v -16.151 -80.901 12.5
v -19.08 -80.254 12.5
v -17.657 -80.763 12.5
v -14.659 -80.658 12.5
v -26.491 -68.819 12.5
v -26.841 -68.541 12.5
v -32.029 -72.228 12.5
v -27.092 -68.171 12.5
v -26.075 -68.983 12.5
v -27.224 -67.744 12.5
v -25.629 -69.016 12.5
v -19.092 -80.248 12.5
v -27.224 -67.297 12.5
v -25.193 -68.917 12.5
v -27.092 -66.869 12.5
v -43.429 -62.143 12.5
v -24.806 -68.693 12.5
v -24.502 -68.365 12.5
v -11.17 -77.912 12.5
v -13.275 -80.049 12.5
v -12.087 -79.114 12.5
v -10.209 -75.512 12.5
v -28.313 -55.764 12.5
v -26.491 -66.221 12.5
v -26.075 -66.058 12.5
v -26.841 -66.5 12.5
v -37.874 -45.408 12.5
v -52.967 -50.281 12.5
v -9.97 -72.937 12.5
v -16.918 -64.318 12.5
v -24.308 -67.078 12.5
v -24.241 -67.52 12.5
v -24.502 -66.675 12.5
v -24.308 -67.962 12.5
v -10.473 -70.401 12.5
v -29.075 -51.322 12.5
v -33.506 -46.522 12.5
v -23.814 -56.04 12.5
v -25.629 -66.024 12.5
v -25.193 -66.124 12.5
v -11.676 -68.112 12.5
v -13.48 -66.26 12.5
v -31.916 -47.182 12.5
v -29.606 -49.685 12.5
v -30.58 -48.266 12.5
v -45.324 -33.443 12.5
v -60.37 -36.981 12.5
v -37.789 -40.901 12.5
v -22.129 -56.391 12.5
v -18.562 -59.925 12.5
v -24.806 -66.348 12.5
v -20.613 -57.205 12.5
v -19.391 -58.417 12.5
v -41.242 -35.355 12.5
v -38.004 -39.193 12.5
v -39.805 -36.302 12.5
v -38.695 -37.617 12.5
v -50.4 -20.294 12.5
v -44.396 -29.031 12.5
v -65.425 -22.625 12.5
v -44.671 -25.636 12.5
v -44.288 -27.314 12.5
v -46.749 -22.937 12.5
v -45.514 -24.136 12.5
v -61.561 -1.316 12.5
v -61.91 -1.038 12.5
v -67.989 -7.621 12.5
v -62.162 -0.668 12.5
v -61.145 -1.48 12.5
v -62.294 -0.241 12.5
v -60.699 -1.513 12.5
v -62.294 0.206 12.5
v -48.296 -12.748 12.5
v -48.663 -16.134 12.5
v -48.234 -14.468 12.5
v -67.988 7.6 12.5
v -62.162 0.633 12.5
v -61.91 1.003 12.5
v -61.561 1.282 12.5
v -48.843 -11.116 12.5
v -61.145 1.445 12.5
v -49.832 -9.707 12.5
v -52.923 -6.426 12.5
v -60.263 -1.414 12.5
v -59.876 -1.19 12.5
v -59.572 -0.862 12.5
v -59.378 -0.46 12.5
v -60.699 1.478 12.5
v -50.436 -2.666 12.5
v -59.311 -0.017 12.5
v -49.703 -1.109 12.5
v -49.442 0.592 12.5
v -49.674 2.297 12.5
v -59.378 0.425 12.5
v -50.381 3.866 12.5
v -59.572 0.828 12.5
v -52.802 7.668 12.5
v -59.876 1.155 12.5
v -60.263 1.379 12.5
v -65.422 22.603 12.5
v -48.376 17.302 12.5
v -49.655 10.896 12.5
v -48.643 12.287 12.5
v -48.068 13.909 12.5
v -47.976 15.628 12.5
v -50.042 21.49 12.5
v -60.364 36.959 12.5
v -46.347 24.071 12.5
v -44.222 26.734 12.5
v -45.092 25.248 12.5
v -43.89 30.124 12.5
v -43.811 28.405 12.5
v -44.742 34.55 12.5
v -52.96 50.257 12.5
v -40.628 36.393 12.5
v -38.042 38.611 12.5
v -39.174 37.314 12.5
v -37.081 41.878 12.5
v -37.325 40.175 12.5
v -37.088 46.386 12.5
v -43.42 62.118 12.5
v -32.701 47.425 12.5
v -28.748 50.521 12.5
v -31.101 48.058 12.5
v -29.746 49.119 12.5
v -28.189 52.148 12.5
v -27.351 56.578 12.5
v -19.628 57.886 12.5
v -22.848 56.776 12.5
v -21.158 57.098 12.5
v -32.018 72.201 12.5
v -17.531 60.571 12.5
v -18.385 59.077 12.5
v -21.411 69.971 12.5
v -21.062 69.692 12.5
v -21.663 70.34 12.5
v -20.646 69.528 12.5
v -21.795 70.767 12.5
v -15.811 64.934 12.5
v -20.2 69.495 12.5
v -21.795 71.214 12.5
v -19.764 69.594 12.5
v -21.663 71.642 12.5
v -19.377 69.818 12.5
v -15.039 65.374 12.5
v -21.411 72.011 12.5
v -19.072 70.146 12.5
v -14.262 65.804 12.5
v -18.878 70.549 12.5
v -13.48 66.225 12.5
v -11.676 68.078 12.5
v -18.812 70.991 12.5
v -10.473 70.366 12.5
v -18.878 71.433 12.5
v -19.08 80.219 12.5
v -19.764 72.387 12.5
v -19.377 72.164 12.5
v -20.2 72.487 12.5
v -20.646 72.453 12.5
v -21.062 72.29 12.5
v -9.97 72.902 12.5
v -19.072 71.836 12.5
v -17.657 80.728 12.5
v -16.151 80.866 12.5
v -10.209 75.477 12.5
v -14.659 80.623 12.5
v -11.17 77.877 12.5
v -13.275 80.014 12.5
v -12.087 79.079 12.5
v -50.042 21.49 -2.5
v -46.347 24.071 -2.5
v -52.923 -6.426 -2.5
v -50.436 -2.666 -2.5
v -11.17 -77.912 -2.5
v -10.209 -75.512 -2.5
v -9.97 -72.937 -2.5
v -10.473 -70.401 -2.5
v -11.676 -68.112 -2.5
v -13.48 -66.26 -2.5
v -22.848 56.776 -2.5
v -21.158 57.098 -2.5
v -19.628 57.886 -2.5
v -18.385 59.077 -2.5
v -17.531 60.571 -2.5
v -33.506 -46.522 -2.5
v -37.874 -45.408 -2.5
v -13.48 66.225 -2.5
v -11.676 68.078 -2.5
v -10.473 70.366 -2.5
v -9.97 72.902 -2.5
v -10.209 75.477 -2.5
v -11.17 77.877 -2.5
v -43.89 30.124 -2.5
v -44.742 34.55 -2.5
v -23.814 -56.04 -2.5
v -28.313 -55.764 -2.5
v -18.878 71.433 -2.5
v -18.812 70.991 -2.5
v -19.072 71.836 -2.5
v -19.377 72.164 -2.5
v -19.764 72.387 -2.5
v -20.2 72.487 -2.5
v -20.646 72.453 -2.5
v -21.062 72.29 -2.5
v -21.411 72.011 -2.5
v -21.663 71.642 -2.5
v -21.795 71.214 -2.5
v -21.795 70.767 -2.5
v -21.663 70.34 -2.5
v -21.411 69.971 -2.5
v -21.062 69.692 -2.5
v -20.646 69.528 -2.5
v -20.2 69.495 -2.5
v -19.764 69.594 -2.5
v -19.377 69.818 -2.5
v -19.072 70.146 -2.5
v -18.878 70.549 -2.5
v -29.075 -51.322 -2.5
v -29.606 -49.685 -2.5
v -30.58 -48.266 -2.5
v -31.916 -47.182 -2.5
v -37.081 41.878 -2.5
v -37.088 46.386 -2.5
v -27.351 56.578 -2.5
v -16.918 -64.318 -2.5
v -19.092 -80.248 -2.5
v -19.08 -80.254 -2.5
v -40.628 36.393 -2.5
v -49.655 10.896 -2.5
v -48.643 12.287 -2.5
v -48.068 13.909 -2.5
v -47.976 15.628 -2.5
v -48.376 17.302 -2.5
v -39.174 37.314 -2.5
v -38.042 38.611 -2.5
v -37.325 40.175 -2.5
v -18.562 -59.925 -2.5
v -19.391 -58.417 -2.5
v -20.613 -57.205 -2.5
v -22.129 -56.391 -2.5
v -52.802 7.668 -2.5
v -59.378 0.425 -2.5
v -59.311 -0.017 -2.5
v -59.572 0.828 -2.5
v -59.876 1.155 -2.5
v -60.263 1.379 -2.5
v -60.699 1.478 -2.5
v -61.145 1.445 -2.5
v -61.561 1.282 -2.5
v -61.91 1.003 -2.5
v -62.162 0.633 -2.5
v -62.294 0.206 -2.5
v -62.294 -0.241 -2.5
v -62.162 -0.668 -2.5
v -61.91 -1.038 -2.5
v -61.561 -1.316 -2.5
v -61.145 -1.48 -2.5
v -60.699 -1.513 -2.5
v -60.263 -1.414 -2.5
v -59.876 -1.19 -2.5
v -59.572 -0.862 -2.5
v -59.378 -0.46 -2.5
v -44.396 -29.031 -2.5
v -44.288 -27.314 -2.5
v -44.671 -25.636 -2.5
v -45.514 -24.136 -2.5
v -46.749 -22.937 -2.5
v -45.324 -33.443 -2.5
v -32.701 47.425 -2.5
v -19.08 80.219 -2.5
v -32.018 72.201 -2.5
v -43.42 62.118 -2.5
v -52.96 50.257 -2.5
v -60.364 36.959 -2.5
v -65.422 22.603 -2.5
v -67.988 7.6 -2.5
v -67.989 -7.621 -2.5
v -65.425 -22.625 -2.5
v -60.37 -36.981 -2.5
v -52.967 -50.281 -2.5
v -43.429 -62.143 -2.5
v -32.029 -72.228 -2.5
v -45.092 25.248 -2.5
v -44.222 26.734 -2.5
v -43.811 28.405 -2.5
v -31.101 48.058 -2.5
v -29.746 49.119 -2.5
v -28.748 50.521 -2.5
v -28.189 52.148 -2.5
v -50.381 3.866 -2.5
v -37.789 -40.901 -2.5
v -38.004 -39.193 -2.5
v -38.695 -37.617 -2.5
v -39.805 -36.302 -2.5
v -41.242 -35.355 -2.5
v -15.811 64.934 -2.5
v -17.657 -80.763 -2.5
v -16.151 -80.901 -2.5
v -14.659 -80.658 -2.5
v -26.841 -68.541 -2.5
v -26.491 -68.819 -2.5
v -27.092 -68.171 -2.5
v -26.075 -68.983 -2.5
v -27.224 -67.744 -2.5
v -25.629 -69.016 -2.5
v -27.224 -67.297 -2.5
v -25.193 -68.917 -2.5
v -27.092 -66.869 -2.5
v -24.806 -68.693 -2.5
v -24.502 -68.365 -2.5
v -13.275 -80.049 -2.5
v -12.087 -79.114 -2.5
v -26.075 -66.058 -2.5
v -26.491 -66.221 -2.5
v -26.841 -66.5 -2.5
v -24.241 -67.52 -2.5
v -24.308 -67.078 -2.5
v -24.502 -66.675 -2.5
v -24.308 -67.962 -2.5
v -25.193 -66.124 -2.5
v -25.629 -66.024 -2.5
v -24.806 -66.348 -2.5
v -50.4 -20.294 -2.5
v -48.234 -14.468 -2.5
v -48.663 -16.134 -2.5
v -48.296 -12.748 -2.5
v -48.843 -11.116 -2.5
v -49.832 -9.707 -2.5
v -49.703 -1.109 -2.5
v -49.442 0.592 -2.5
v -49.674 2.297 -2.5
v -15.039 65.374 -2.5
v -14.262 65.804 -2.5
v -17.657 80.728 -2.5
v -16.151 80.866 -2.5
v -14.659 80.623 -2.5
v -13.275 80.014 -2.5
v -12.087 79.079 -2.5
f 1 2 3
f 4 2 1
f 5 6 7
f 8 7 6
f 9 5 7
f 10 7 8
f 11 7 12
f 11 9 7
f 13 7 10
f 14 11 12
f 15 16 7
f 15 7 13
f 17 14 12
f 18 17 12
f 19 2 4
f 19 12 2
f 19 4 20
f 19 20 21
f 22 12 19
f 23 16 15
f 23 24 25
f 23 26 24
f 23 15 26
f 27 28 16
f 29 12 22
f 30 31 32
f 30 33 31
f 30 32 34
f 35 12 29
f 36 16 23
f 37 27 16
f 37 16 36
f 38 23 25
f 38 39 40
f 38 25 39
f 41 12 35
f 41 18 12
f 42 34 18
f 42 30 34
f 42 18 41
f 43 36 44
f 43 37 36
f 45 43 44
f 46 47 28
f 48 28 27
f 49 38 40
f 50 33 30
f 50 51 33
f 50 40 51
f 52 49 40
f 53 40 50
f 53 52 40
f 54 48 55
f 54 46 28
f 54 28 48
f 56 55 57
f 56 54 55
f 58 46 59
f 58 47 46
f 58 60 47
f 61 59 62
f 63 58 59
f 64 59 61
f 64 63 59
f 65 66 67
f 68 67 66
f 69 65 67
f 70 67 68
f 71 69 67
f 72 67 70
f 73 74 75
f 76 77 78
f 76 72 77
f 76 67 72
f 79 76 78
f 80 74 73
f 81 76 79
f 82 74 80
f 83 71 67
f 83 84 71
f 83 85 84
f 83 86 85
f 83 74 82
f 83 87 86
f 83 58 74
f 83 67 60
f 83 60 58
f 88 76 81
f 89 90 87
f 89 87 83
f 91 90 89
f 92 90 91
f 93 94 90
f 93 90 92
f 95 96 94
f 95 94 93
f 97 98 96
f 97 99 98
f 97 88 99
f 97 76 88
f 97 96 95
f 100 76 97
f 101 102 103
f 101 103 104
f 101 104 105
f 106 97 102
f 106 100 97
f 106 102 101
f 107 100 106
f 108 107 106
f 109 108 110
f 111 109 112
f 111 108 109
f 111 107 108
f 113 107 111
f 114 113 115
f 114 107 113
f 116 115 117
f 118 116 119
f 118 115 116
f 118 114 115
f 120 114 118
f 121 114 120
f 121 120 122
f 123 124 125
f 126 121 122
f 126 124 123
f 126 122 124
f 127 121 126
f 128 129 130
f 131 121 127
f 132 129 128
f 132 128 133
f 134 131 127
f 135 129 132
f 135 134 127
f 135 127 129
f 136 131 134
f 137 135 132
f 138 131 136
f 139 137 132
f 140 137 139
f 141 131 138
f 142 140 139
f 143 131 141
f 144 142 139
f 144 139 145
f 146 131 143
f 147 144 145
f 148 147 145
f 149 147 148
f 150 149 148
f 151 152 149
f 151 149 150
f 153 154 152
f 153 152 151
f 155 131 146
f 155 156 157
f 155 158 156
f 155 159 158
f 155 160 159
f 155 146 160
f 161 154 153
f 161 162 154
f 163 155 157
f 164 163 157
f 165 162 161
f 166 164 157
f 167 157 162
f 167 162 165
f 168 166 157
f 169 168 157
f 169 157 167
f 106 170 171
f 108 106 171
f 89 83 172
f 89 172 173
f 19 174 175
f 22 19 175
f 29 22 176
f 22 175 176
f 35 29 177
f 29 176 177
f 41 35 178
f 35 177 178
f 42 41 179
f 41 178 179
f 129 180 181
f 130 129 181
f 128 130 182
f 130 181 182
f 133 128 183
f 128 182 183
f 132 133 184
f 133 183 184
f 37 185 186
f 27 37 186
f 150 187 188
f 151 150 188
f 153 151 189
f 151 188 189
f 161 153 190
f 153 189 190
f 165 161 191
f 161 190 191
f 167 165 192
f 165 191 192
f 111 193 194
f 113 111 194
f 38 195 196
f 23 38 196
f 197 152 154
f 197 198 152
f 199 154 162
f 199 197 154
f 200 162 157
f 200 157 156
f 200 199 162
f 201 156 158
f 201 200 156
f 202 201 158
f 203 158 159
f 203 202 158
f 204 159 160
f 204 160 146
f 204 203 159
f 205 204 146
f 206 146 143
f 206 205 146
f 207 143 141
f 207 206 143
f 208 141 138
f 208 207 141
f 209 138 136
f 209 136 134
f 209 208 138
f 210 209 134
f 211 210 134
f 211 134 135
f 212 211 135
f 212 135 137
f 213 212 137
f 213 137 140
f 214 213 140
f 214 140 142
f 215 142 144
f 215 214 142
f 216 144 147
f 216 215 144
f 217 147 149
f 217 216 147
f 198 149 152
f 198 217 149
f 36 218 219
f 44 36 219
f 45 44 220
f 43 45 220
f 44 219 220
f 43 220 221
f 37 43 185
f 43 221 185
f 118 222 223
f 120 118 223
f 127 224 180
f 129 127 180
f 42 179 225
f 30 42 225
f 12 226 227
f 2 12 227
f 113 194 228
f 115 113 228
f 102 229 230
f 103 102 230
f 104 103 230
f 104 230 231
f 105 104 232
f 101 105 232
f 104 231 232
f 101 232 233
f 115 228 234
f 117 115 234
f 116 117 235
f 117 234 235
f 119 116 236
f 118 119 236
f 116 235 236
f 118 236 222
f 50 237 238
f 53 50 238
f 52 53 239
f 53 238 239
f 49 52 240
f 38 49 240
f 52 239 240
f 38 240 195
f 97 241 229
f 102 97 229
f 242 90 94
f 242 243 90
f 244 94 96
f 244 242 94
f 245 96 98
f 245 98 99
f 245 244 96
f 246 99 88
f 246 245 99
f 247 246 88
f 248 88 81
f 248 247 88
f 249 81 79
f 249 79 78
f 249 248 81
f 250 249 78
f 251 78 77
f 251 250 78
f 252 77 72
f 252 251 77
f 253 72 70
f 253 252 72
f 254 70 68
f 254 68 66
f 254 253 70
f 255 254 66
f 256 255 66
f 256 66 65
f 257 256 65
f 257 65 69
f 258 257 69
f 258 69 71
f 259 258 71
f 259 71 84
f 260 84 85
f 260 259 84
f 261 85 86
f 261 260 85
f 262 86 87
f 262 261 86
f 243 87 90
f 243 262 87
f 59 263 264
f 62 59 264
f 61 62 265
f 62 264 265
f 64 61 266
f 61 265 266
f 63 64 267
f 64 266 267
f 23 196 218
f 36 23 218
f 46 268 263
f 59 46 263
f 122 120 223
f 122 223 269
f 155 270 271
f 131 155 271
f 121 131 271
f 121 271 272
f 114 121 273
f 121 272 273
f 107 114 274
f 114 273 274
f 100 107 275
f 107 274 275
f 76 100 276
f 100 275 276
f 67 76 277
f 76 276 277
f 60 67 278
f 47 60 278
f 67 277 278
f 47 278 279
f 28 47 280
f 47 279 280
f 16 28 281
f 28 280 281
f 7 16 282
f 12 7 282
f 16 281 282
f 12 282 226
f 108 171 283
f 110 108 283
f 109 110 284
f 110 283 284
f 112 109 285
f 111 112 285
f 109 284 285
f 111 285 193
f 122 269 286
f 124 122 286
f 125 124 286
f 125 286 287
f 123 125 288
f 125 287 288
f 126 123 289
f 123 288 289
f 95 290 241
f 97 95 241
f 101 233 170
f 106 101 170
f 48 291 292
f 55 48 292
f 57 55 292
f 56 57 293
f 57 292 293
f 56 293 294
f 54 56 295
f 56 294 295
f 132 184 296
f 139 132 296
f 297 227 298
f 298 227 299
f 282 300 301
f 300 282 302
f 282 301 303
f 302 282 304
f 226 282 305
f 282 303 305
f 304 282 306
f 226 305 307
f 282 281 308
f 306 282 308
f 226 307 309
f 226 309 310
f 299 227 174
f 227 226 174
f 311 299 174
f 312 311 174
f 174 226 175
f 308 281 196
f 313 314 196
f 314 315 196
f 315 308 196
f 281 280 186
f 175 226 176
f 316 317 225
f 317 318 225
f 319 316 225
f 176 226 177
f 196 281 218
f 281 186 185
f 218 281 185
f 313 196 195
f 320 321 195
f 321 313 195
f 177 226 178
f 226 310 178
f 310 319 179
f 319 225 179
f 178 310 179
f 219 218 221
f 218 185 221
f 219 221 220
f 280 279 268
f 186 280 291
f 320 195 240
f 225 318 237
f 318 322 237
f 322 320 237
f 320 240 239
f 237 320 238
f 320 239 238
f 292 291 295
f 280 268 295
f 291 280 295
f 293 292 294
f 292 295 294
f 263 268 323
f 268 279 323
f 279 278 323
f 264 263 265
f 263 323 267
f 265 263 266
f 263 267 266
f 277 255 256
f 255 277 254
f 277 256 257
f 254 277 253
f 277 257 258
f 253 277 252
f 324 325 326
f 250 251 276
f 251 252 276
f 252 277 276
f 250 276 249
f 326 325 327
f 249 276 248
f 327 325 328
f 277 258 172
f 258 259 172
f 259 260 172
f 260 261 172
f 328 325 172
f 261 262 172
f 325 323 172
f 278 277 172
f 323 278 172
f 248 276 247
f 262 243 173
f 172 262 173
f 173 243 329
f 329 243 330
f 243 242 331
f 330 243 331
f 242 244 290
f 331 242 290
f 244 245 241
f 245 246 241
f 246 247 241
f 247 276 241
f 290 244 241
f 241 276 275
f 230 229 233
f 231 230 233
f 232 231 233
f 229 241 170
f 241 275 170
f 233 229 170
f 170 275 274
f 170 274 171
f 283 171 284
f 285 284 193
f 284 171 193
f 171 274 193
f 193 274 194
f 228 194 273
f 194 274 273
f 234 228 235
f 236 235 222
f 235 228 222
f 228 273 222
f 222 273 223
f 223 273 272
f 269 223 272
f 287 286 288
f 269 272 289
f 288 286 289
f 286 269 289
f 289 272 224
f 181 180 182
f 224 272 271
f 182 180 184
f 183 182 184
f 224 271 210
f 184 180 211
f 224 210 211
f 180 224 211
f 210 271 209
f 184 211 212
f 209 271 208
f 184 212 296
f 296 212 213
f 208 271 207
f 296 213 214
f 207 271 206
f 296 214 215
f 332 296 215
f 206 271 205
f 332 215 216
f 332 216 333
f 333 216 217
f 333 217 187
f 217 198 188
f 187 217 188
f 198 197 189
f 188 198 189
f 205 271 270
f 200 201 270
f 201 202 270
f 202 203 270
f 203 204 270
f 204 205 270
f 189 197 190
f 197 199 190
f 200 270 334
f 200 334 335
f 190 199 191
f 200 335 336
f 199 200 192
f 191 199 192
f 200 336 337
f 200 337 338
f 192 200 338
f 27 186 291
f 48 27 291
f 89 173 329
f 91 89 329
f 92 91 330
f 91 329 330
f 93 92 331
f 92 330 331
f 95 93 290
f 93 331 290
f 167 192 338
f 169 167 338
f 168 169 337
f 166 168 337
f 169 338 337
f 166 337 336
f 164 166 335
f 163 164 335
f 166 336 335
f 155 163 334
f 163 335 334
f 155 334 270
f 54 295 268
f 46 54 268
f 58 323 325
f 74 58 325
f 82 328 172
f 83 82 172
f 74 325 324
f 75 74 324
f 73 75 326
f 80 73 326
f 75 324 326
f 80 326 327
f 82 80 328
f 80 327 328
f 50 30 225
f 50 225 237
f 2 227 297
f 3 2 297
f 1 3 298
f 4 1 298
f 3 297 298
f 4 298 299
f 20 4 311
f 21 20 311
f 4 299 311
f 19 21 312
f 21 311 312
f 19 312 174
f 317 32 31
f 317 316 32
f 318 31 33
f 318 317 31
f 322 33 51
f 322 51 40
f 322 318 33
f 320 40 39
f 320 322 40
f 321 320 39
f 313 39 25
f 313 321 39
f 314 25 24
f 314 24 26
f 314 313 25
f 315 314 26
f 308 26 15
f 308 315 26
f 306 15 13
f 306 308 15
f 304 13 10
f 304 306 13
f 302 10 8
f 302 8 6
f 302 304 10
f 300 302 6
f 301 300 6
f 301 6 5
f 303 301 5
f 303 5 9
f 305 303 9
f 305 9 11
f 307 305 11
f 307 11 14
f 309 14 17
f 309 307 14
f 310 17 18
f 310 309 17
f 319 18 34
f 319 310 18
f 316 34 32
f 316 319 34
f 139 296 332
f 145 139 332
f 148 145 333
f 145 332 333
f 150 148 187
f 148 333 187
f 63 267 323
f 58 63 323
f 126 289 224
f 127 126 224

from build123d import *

# Parameters (mm, degrees)
SKETCH_1_R        = 1
EXTRUDE_1_DEPTH   = 1
SKETCH_1_2_R      = 1
EXTRUDE_1_2_DEPTH = 8
SKETCH_1_3_R      = 1
EXTRUDE_2_DEPTH   = 10
SCALE_4_SCALE     = 1.5


with BuildPart() as part:
    # 草图1 → Extrude 1 (new body)
    with BuildSketch(Plane.XY):
        with BuildLine():
            Line((-23.446136356, -44.161959762), (-25.73775467, -42.866863479))
            Line((-25.73775467, -42.866863479), (-26.834295942, -39.938466016))
            ThreePointArc((-26.834295942, -39.938466016), (-28.201527977, -38.125336415), (-30.335428898, -37.348658075))
            Line((-30.335428898, -37.348658075), (-33.334907776, -37.164700371))
            Line((-33.334907776, -37.164700371), (-33.842709051, -34.202800331))
            ThreePointArc((-33.842709051, -34.202800331), (-34.84597704, -32.165592505), (-36.7965457, -31.002818113))
            Line((-36.7965457, -31.002818113), (-39.708425324, -30.260072511))
            Line((-39.708425324, -30.260072511), (-39.652227319, -27.255483394))
            ThreePointArc((-39.652227319, -27.255483394), (-40.255989993, -25.066366444), (-41.954126526, -23.558687864))
            Line((-41.954126526, -23.558687864), (-44.675252109, -22.283466496))
            Line((-44.675252109, -22.283466496), (-44.057045667, -19.342627369))
            ThreePointArc((-44.057045667, -19.342627369), (-44.239914432, -17.079151855), (-45.625461503, -15.279979352))
            Line((-45.625461503, -15.279979352), (-48.059435816, -13.517457571))
            Line((-48.059435816, -13.517457571), (-46.901121207, -10.744549126))
            ThreePointArc((-46.901121207, -10.744549126), (-46.656617846, -8.486899797), (-47.680491761, -6.459969953))
            Line((-47.680491761, -6.459969953), (-49.741090048, -4.272585973))
            Line((-49.741090048, -4.272585973), (-48.083701146, -1.765839874))
            ThreePointArc((-48.083701146, -1.765839874), (-47.420487313, 0.406004917), (-48.046416828, 2.588887101))
            Line((-48.046416828, 2.588887101), (-49.660641368, 5.123644113))
            Line((-49.660641368, 5.123644113), (-47.562892001, 7.275425136))
            ThreePointArc((-47.562892001, 7.275425136), (-46.504462376, 9.284526705), (-46.710273625, 11.546031539))
            Line((-46.710273625, 11.546031539), (-47.82093971, 14.338366552))
            Line((-47.82093971, 14.338366552), (-45.357143694, 16.058954583))
            ThreePointArc((-45.357143694, 16.058954583), (-43.940993675, 17.834139505), (-43.719395692, 20.094152054))
            Line((-43.719395692, 20.094152054), (-44.287157421, 23.045145208))
            Line((-44.287157421, 23.045145208), (-41.54459596, 24.273587558))
            ThreePointArc((-41.54459596, 24.273587558), (-39.820893366, 25.751969023), (-39.17973637, 27.930427214))
            Line((-39.17973637, 27.930427214), (-39.184480502, 30.935538106))
            Line((-39.184480502, 30.935538106), (-36.260310201, 31.628316593))
            ThreePointArc((-36.260310201, 31.628316593), (-34.290118058, 32.757522199), (-33.252115355, 34.777253066))
            Line((-33.252115355, 34.777253066), (-32.693673826, 37.730024144))
            Line((-32.693673826, 37.730024144), (-29.691484877, 37.862596744))
            ThreePointArc((-29.691484877, 37.862596744), (-27.544598222, 38.602623821), (-26.146521576, 40.39207739))
            Line((-26.146521576, 40.39207739), (-25, 43.301270189))
            ThreePointArc((-25, 43.301270189), (-24.226890609, 43.73851588), (-23.446136356, 44.161959762))
            ThreePointArc((-23.446136356, 44.161959762), (-21.212806241, 47.755648425), (-21.906244367, 51.929556087))
            ThreePointArc((-21.906244367, 51.929556087), (-24.232021318, 53.76021953), (-27.179564099, 53.490852446))
            ThreePointArc((-27.179564099, 53.490852446), (-59.999999835, 0.004450967), (-27.1875, -53.486819346))
            Line((-27.1875, -53.486819346), (-27.179564099, -53.490852446))
            ThreePointArc((-27.179564099, -53.490852446), (-24.232021318, -53.76021953), (-21.906244367, -51.929556087))
            ThreePointArc((-21.906244367, -51.929556087), (-21.212806241, -47.755648425), (-23.446136356, -44.161959762))
        make_face()
        with Locations((-31.620079453, -45.001895242)):
            Circle(SKETCH_1_R, mode=Mode.SUBTRACT)
        with Locations((-55, 0)):
            Circle(SKETCH_1_R, mode=Mode.SUBTRACT)
        with Locations((-28.000624989, 47.338831842)):
            Circle(SKETCH_1_R, mode=Mode.SUBTRACT)
    extrude(amount=EXTRUDE_1_DEPTH)

    # 草图1<2> → Extrude 1 2 (add)
    with BuildSketch(Plane.XY):
        with BuildLine():
            Line((-23.446136356, -44.161959762), (-25.73775467, -42.866863479))
            Line((-25.73775467, -42.866863479), (-26.834295942, -39.938466016))
            ThreePointArc((-26.834295942, -39.938466016), (-28.201527977, -38.125336415), (-30.335428898, -37.348658075))
            Line((-30.335428898, -37.348658075), (-33.334907776, -37.164700371))
            Line((-33.334907776, -37.164700371), (-33.842709051, -34.202800331))
            ThreePointArc((-33.842709051, -34.202800331), (-34.84597704, -32.165592505), (-36.7965457, -31.002818113))
            Line((-36.7965457, -31.002818113), (-39.708425324, -30.260072511))
            Line((-39.708425324, -30.260072511), (-39.652227319, -27.255483394))
            ThreePointArc((-39.652227319, -27.255483394), (-40.255989993, -25.066366444), (-41.954126526, -23.558687864))
            Line((-41.954126526, -23.558687864), (-44.675252109, -22.283466496))
            Line((-44.675252109, -22.283466496), (-44.057045667, -19.342627369))
            ThreePointArc((-44.057045667, -19.342627369), (-44.239914432, -17.079151855), (-45.625461503, -15.279979352))
            Line((-45.625461503, -15.279979352), (-48.059435816, -13.517457571))
            Line((-48.059435816, -13.517457571), (-46.901121207, -10.744549126))
            ThreePointArc((-46.901121207, -10.744549126), (-46.656617846, -8.486899797), (-47.680491761, -6.459969953))
            Line((-47.680491761, -6.459969953), (-49.741090048, -4.272585973))
            Line((-49.741090048, -4.272585973), (-48.083701146, -1.765839874))
            ThreePointArc((-48.083701146, -1.765839874), (-47.420487313, 0.406004917), (-48.046416828, 2.588887101))
            Line((-48.046416828, 2.588887101), (-49.660641368, 5.123644113))
            Line((-49.660641368, 5.123644113), (-47.562892001, 7.275425136))
            ThreePointArc((-47.562892001, 7.275425136), (-46.504462376, 9.284526705), (-46.710273625, 11.546031539))
            Line((-46.710273625, 11.546031539), (-47.82093971, 14.338366552))
            Line((-47.82093971, 14.338366552), (-45.357143694, 16.058954583))
            ThreePointArc((-45.357143694, 16.058954583), (-43.940993675, 17.834139505), (-43.719395692, 20.094152054))
            Line((-43.719395692, 20.094152054), (-44.287157421, 23.045145208))
            Line((-44.287157421, 23.045145208), (-41.54459596, 24.273587558))
            ThreePointArc((-41.54459596, 24.273587558), (-39.820893366, 25.751969023), (-39.17973637, 27.930427214))
            Line((-39.17973637, 27.930427214), (-39.184480502, 30.935538106))
            Line((-39.184480502, 30.935538106), (-36.260310201, 31.628316593))
            ThreePointArc((-36.260310201, 31.628316593), (-34.290118058, 32.757522199), (-33.252115355, 34.777253066))
            Line((-33.252115355, 34.777253066), (-32.693673826, 37.730024144))
            Line((-32.693673826, 37.730024144), (-29.691484877, 37.862596744))
            ThreePointArc((-29.691484877, 37.862596744), (-27.544598222, 38.602623821), (-26.146521576, 40.39207739))
            Line((-26.146521576, 40.39207739), (-25, 43.301270189))
            ThreePointArc((-25, 43.301270189), (-24.226890609, 43.73851588), (-23.446136356, 44.161959762))
            ThreePointArc((-23.446136356, 44.161959762), (-21.212806241, 47.755648425), (-21.906244367, 51.929556087))
            ThreePointArc((-21.906244367, 51.929556087), (-24.232021318, 53.76021953), (-27.179564099, 53.490852446))
            ThreePointArc((-27.179564099, 53.490852446), (-59.999999835, 0.004450967), (-27.1875, -53.486819346))
            Line((-27.1875, -53.486819346), (-27.179564099, -53.490852446))
            ThreePointArc((-27.179564099, -53.490852446), (-24.232021318, -53.76021953), (-21.906244367, -51.929556087))
            ThreePointArc((-21.906244367, -51.929556087), (-21.212806241, -47.755648425), (-23.446136356, -44.161959762))
        make_face()
        with Locations((-31.620079453, -45.001895242)):
            Circle(SKETCH_1_2_R, mode=Mode.SUBTRACT)
        with Locations((-55, 0)):
            Circle(SKETCH_1_2_R, mode=Mode.SUBTRACT)
        with Locations((-28.000624989, 47.338831842)):
            Circle(SKETCH_1_2_R, mode=Mode.SUBTRACT)
    extrude(amount=EXTRUDE_1_2_DEPTH)

    # 草图1<3> → 凸台-拉伸2 (add)
    with BuildSketch(Plane.XY):
        with BuildLine():
            Line((-23.446136356, -44.161959762), (-25.73775467, -42.866863479))
            Line((-25.73775467, -42.866863479), (-26.834295942, -39.938466016))
            ThreePointArc((-26.834295942, -39.938466016), (-28.201527977, -38.125336415), (-30.335428898, -37.348658075))
            Line((-30.335428898, -37.348658075), (-33.334907776, -37.164700371))
            Line((-33.334907776, -37.164700371), (-33.842709051, -34.202800331))
            ThreePointArc((-33.842709051, -34.202800331), (-34.84597704, -32.165592505), (-36.7965457, -31.002818113))
            Line((-36.7965457, -31.002818113), (-39.708425324, -30.260072511))
            Line((-39.708425324, -30.260072511), (-39.652227319, -27.255483394))
            ThreePointArc((-39.652227319, -27.255483394), (-40.255989993, -25.066366444), (-41.954126526, -23.558687864))
            Line((-41.954126526, -23.558687864), (-44.675252109, -22.283466496))
            Line((-44.675252109, -22.283466496), (-44.057045667, -19.342627369))
            ThreePointArc((-44.057045667, -19.342627369), (-44.239914432, -17.079151855), (-45.625461503, -15.279979352))
            Line((-45.625461503, -15.279979352), (-48.059435816, -13.517457571))
            Line((-48.059435816, -13.517457571), (-46.901121207, -10.744549126))
            ThreePointArc((-46.901121207, -10.744549126), (-46.656617846, -8.486899797), (-47.680491761, -6.459969953))
            Line((-47.680491761, -6.459969953), (-49.741090048, -4.272585973))
            Line((-49.741090048, -4.272585973), (-48.083701146, -1.765839874))
            ThreePointArc((-48.083701146, -1.765839874), (-47.420487313, 0.406004917), (-48.046416828, 2.588887101))
            Line((-48.046416828, 2.588887101), (-49.660641368, 5.123644113))
            Line((-49.660641368, 5.123644113), (-47.562892001, 7.275425136))
            ThreePointArc((-47.562892001, 7.275425136), (-46.504462376, 9.284526705), (-46.710273625, 11.546031539))
            Line((-46.710273625, 11.546031539), (-47.82093971, 14.338366552))
            Line((-47.82093971, 14.338366552), (-45.357143694, 16.058954583))
            ThreePointArc((-45.357143694, 16.058954583), (-43.940993675, 17.834139505), (-43.719395692, 20.094152054))
            Line((-43.719395692, 20.094152054), (-44.287157421, 23.045145208))
            Line((-44.287157421, 23.045145208), (-41.54459596, 24.273587558))
            ThreePointArc((-41.54459596, 24.273587558), (-39.820893366, 25.751969023), (-39.17973637, 27.930427214))
            Line((-39.17973637, 27.930427214), (-39.184480502, 30.935538106))
            Line((-39.184480502, 30.935538106), (-36.260310201, 31.628316593))
            ThreePointArc((-36.260310201, 31.628316593), (-34.290118058, 32.757522199), (-33.252115355, 34.777253066))
            Line((-33.252115355, 34.777253066), (-32.693673826, 37.730024144))
            Line((-32.693673826, 37.730024144), (-29.691484877, 37.862596744))
            ThreePointArc((-29.691484877, 37.862596744), (-27.544598222, 38.602623821), (-26.146521576, 40.39207739))
            Line((-26.146521576, 40.39207739), (-25, 43.301270189))
            ThreePointArc((-25, 43.301270189), (-24.226890609, 43.73851588), (-23.446136356, 44.161959762))
            ThreePointArc((-23.446136356, 44.161959762), (-21.212806241, 47.755648425), (-21.906244367, 51.929556087))
            ThreePointArc((-21.906244367, 51.929556087), (-24.232021318, 53.76021953), (-27.179564099, 53.490852446))
            ThreePointArc((-27.179564099, 53.490852446), (-59.999999835, 0.004450967), (-27.1875, -53.486819346))
            Line((-27.1875, -53.486819346), (-27.179564099, -53.490852446))
            ThreePointArc((-27.179564099, -53.490852446), (-24.232021318, -53.76021953), (-21.906244367, -51.929556087))
            ThreePointArc((-21.906244367, -51.929556087), (-21.212806241, -47.755648425), (-23.446136356, -44.161959762))
        make_face()
        with Locations((-31.620079453, -45.001895242)):
            Circle(SKETCH_1_3_R, mode=Mode.SUBTRACT)
        with Locations((-55, 0)):
            Circle(SKETCH_1_3_R, mode=Mode.SUBTRACT)
        with Locations((-28.000624989, 47.338831842)):
            Circle(SKETCH_1_3_R, mode=Mode.SUBTRACT)
    extrude(amount=EXTRUDE_2_DEPTH)


with BuildPart() as part_1:
    # 缩放比例4: scaled about (-43.37819964, 0.034879878, 5)
    add(part.part.scale(SCALE_4_SCALE).moved(Location((21.68909982, -0.017439939, -2.5))))


solid = part_1.part
